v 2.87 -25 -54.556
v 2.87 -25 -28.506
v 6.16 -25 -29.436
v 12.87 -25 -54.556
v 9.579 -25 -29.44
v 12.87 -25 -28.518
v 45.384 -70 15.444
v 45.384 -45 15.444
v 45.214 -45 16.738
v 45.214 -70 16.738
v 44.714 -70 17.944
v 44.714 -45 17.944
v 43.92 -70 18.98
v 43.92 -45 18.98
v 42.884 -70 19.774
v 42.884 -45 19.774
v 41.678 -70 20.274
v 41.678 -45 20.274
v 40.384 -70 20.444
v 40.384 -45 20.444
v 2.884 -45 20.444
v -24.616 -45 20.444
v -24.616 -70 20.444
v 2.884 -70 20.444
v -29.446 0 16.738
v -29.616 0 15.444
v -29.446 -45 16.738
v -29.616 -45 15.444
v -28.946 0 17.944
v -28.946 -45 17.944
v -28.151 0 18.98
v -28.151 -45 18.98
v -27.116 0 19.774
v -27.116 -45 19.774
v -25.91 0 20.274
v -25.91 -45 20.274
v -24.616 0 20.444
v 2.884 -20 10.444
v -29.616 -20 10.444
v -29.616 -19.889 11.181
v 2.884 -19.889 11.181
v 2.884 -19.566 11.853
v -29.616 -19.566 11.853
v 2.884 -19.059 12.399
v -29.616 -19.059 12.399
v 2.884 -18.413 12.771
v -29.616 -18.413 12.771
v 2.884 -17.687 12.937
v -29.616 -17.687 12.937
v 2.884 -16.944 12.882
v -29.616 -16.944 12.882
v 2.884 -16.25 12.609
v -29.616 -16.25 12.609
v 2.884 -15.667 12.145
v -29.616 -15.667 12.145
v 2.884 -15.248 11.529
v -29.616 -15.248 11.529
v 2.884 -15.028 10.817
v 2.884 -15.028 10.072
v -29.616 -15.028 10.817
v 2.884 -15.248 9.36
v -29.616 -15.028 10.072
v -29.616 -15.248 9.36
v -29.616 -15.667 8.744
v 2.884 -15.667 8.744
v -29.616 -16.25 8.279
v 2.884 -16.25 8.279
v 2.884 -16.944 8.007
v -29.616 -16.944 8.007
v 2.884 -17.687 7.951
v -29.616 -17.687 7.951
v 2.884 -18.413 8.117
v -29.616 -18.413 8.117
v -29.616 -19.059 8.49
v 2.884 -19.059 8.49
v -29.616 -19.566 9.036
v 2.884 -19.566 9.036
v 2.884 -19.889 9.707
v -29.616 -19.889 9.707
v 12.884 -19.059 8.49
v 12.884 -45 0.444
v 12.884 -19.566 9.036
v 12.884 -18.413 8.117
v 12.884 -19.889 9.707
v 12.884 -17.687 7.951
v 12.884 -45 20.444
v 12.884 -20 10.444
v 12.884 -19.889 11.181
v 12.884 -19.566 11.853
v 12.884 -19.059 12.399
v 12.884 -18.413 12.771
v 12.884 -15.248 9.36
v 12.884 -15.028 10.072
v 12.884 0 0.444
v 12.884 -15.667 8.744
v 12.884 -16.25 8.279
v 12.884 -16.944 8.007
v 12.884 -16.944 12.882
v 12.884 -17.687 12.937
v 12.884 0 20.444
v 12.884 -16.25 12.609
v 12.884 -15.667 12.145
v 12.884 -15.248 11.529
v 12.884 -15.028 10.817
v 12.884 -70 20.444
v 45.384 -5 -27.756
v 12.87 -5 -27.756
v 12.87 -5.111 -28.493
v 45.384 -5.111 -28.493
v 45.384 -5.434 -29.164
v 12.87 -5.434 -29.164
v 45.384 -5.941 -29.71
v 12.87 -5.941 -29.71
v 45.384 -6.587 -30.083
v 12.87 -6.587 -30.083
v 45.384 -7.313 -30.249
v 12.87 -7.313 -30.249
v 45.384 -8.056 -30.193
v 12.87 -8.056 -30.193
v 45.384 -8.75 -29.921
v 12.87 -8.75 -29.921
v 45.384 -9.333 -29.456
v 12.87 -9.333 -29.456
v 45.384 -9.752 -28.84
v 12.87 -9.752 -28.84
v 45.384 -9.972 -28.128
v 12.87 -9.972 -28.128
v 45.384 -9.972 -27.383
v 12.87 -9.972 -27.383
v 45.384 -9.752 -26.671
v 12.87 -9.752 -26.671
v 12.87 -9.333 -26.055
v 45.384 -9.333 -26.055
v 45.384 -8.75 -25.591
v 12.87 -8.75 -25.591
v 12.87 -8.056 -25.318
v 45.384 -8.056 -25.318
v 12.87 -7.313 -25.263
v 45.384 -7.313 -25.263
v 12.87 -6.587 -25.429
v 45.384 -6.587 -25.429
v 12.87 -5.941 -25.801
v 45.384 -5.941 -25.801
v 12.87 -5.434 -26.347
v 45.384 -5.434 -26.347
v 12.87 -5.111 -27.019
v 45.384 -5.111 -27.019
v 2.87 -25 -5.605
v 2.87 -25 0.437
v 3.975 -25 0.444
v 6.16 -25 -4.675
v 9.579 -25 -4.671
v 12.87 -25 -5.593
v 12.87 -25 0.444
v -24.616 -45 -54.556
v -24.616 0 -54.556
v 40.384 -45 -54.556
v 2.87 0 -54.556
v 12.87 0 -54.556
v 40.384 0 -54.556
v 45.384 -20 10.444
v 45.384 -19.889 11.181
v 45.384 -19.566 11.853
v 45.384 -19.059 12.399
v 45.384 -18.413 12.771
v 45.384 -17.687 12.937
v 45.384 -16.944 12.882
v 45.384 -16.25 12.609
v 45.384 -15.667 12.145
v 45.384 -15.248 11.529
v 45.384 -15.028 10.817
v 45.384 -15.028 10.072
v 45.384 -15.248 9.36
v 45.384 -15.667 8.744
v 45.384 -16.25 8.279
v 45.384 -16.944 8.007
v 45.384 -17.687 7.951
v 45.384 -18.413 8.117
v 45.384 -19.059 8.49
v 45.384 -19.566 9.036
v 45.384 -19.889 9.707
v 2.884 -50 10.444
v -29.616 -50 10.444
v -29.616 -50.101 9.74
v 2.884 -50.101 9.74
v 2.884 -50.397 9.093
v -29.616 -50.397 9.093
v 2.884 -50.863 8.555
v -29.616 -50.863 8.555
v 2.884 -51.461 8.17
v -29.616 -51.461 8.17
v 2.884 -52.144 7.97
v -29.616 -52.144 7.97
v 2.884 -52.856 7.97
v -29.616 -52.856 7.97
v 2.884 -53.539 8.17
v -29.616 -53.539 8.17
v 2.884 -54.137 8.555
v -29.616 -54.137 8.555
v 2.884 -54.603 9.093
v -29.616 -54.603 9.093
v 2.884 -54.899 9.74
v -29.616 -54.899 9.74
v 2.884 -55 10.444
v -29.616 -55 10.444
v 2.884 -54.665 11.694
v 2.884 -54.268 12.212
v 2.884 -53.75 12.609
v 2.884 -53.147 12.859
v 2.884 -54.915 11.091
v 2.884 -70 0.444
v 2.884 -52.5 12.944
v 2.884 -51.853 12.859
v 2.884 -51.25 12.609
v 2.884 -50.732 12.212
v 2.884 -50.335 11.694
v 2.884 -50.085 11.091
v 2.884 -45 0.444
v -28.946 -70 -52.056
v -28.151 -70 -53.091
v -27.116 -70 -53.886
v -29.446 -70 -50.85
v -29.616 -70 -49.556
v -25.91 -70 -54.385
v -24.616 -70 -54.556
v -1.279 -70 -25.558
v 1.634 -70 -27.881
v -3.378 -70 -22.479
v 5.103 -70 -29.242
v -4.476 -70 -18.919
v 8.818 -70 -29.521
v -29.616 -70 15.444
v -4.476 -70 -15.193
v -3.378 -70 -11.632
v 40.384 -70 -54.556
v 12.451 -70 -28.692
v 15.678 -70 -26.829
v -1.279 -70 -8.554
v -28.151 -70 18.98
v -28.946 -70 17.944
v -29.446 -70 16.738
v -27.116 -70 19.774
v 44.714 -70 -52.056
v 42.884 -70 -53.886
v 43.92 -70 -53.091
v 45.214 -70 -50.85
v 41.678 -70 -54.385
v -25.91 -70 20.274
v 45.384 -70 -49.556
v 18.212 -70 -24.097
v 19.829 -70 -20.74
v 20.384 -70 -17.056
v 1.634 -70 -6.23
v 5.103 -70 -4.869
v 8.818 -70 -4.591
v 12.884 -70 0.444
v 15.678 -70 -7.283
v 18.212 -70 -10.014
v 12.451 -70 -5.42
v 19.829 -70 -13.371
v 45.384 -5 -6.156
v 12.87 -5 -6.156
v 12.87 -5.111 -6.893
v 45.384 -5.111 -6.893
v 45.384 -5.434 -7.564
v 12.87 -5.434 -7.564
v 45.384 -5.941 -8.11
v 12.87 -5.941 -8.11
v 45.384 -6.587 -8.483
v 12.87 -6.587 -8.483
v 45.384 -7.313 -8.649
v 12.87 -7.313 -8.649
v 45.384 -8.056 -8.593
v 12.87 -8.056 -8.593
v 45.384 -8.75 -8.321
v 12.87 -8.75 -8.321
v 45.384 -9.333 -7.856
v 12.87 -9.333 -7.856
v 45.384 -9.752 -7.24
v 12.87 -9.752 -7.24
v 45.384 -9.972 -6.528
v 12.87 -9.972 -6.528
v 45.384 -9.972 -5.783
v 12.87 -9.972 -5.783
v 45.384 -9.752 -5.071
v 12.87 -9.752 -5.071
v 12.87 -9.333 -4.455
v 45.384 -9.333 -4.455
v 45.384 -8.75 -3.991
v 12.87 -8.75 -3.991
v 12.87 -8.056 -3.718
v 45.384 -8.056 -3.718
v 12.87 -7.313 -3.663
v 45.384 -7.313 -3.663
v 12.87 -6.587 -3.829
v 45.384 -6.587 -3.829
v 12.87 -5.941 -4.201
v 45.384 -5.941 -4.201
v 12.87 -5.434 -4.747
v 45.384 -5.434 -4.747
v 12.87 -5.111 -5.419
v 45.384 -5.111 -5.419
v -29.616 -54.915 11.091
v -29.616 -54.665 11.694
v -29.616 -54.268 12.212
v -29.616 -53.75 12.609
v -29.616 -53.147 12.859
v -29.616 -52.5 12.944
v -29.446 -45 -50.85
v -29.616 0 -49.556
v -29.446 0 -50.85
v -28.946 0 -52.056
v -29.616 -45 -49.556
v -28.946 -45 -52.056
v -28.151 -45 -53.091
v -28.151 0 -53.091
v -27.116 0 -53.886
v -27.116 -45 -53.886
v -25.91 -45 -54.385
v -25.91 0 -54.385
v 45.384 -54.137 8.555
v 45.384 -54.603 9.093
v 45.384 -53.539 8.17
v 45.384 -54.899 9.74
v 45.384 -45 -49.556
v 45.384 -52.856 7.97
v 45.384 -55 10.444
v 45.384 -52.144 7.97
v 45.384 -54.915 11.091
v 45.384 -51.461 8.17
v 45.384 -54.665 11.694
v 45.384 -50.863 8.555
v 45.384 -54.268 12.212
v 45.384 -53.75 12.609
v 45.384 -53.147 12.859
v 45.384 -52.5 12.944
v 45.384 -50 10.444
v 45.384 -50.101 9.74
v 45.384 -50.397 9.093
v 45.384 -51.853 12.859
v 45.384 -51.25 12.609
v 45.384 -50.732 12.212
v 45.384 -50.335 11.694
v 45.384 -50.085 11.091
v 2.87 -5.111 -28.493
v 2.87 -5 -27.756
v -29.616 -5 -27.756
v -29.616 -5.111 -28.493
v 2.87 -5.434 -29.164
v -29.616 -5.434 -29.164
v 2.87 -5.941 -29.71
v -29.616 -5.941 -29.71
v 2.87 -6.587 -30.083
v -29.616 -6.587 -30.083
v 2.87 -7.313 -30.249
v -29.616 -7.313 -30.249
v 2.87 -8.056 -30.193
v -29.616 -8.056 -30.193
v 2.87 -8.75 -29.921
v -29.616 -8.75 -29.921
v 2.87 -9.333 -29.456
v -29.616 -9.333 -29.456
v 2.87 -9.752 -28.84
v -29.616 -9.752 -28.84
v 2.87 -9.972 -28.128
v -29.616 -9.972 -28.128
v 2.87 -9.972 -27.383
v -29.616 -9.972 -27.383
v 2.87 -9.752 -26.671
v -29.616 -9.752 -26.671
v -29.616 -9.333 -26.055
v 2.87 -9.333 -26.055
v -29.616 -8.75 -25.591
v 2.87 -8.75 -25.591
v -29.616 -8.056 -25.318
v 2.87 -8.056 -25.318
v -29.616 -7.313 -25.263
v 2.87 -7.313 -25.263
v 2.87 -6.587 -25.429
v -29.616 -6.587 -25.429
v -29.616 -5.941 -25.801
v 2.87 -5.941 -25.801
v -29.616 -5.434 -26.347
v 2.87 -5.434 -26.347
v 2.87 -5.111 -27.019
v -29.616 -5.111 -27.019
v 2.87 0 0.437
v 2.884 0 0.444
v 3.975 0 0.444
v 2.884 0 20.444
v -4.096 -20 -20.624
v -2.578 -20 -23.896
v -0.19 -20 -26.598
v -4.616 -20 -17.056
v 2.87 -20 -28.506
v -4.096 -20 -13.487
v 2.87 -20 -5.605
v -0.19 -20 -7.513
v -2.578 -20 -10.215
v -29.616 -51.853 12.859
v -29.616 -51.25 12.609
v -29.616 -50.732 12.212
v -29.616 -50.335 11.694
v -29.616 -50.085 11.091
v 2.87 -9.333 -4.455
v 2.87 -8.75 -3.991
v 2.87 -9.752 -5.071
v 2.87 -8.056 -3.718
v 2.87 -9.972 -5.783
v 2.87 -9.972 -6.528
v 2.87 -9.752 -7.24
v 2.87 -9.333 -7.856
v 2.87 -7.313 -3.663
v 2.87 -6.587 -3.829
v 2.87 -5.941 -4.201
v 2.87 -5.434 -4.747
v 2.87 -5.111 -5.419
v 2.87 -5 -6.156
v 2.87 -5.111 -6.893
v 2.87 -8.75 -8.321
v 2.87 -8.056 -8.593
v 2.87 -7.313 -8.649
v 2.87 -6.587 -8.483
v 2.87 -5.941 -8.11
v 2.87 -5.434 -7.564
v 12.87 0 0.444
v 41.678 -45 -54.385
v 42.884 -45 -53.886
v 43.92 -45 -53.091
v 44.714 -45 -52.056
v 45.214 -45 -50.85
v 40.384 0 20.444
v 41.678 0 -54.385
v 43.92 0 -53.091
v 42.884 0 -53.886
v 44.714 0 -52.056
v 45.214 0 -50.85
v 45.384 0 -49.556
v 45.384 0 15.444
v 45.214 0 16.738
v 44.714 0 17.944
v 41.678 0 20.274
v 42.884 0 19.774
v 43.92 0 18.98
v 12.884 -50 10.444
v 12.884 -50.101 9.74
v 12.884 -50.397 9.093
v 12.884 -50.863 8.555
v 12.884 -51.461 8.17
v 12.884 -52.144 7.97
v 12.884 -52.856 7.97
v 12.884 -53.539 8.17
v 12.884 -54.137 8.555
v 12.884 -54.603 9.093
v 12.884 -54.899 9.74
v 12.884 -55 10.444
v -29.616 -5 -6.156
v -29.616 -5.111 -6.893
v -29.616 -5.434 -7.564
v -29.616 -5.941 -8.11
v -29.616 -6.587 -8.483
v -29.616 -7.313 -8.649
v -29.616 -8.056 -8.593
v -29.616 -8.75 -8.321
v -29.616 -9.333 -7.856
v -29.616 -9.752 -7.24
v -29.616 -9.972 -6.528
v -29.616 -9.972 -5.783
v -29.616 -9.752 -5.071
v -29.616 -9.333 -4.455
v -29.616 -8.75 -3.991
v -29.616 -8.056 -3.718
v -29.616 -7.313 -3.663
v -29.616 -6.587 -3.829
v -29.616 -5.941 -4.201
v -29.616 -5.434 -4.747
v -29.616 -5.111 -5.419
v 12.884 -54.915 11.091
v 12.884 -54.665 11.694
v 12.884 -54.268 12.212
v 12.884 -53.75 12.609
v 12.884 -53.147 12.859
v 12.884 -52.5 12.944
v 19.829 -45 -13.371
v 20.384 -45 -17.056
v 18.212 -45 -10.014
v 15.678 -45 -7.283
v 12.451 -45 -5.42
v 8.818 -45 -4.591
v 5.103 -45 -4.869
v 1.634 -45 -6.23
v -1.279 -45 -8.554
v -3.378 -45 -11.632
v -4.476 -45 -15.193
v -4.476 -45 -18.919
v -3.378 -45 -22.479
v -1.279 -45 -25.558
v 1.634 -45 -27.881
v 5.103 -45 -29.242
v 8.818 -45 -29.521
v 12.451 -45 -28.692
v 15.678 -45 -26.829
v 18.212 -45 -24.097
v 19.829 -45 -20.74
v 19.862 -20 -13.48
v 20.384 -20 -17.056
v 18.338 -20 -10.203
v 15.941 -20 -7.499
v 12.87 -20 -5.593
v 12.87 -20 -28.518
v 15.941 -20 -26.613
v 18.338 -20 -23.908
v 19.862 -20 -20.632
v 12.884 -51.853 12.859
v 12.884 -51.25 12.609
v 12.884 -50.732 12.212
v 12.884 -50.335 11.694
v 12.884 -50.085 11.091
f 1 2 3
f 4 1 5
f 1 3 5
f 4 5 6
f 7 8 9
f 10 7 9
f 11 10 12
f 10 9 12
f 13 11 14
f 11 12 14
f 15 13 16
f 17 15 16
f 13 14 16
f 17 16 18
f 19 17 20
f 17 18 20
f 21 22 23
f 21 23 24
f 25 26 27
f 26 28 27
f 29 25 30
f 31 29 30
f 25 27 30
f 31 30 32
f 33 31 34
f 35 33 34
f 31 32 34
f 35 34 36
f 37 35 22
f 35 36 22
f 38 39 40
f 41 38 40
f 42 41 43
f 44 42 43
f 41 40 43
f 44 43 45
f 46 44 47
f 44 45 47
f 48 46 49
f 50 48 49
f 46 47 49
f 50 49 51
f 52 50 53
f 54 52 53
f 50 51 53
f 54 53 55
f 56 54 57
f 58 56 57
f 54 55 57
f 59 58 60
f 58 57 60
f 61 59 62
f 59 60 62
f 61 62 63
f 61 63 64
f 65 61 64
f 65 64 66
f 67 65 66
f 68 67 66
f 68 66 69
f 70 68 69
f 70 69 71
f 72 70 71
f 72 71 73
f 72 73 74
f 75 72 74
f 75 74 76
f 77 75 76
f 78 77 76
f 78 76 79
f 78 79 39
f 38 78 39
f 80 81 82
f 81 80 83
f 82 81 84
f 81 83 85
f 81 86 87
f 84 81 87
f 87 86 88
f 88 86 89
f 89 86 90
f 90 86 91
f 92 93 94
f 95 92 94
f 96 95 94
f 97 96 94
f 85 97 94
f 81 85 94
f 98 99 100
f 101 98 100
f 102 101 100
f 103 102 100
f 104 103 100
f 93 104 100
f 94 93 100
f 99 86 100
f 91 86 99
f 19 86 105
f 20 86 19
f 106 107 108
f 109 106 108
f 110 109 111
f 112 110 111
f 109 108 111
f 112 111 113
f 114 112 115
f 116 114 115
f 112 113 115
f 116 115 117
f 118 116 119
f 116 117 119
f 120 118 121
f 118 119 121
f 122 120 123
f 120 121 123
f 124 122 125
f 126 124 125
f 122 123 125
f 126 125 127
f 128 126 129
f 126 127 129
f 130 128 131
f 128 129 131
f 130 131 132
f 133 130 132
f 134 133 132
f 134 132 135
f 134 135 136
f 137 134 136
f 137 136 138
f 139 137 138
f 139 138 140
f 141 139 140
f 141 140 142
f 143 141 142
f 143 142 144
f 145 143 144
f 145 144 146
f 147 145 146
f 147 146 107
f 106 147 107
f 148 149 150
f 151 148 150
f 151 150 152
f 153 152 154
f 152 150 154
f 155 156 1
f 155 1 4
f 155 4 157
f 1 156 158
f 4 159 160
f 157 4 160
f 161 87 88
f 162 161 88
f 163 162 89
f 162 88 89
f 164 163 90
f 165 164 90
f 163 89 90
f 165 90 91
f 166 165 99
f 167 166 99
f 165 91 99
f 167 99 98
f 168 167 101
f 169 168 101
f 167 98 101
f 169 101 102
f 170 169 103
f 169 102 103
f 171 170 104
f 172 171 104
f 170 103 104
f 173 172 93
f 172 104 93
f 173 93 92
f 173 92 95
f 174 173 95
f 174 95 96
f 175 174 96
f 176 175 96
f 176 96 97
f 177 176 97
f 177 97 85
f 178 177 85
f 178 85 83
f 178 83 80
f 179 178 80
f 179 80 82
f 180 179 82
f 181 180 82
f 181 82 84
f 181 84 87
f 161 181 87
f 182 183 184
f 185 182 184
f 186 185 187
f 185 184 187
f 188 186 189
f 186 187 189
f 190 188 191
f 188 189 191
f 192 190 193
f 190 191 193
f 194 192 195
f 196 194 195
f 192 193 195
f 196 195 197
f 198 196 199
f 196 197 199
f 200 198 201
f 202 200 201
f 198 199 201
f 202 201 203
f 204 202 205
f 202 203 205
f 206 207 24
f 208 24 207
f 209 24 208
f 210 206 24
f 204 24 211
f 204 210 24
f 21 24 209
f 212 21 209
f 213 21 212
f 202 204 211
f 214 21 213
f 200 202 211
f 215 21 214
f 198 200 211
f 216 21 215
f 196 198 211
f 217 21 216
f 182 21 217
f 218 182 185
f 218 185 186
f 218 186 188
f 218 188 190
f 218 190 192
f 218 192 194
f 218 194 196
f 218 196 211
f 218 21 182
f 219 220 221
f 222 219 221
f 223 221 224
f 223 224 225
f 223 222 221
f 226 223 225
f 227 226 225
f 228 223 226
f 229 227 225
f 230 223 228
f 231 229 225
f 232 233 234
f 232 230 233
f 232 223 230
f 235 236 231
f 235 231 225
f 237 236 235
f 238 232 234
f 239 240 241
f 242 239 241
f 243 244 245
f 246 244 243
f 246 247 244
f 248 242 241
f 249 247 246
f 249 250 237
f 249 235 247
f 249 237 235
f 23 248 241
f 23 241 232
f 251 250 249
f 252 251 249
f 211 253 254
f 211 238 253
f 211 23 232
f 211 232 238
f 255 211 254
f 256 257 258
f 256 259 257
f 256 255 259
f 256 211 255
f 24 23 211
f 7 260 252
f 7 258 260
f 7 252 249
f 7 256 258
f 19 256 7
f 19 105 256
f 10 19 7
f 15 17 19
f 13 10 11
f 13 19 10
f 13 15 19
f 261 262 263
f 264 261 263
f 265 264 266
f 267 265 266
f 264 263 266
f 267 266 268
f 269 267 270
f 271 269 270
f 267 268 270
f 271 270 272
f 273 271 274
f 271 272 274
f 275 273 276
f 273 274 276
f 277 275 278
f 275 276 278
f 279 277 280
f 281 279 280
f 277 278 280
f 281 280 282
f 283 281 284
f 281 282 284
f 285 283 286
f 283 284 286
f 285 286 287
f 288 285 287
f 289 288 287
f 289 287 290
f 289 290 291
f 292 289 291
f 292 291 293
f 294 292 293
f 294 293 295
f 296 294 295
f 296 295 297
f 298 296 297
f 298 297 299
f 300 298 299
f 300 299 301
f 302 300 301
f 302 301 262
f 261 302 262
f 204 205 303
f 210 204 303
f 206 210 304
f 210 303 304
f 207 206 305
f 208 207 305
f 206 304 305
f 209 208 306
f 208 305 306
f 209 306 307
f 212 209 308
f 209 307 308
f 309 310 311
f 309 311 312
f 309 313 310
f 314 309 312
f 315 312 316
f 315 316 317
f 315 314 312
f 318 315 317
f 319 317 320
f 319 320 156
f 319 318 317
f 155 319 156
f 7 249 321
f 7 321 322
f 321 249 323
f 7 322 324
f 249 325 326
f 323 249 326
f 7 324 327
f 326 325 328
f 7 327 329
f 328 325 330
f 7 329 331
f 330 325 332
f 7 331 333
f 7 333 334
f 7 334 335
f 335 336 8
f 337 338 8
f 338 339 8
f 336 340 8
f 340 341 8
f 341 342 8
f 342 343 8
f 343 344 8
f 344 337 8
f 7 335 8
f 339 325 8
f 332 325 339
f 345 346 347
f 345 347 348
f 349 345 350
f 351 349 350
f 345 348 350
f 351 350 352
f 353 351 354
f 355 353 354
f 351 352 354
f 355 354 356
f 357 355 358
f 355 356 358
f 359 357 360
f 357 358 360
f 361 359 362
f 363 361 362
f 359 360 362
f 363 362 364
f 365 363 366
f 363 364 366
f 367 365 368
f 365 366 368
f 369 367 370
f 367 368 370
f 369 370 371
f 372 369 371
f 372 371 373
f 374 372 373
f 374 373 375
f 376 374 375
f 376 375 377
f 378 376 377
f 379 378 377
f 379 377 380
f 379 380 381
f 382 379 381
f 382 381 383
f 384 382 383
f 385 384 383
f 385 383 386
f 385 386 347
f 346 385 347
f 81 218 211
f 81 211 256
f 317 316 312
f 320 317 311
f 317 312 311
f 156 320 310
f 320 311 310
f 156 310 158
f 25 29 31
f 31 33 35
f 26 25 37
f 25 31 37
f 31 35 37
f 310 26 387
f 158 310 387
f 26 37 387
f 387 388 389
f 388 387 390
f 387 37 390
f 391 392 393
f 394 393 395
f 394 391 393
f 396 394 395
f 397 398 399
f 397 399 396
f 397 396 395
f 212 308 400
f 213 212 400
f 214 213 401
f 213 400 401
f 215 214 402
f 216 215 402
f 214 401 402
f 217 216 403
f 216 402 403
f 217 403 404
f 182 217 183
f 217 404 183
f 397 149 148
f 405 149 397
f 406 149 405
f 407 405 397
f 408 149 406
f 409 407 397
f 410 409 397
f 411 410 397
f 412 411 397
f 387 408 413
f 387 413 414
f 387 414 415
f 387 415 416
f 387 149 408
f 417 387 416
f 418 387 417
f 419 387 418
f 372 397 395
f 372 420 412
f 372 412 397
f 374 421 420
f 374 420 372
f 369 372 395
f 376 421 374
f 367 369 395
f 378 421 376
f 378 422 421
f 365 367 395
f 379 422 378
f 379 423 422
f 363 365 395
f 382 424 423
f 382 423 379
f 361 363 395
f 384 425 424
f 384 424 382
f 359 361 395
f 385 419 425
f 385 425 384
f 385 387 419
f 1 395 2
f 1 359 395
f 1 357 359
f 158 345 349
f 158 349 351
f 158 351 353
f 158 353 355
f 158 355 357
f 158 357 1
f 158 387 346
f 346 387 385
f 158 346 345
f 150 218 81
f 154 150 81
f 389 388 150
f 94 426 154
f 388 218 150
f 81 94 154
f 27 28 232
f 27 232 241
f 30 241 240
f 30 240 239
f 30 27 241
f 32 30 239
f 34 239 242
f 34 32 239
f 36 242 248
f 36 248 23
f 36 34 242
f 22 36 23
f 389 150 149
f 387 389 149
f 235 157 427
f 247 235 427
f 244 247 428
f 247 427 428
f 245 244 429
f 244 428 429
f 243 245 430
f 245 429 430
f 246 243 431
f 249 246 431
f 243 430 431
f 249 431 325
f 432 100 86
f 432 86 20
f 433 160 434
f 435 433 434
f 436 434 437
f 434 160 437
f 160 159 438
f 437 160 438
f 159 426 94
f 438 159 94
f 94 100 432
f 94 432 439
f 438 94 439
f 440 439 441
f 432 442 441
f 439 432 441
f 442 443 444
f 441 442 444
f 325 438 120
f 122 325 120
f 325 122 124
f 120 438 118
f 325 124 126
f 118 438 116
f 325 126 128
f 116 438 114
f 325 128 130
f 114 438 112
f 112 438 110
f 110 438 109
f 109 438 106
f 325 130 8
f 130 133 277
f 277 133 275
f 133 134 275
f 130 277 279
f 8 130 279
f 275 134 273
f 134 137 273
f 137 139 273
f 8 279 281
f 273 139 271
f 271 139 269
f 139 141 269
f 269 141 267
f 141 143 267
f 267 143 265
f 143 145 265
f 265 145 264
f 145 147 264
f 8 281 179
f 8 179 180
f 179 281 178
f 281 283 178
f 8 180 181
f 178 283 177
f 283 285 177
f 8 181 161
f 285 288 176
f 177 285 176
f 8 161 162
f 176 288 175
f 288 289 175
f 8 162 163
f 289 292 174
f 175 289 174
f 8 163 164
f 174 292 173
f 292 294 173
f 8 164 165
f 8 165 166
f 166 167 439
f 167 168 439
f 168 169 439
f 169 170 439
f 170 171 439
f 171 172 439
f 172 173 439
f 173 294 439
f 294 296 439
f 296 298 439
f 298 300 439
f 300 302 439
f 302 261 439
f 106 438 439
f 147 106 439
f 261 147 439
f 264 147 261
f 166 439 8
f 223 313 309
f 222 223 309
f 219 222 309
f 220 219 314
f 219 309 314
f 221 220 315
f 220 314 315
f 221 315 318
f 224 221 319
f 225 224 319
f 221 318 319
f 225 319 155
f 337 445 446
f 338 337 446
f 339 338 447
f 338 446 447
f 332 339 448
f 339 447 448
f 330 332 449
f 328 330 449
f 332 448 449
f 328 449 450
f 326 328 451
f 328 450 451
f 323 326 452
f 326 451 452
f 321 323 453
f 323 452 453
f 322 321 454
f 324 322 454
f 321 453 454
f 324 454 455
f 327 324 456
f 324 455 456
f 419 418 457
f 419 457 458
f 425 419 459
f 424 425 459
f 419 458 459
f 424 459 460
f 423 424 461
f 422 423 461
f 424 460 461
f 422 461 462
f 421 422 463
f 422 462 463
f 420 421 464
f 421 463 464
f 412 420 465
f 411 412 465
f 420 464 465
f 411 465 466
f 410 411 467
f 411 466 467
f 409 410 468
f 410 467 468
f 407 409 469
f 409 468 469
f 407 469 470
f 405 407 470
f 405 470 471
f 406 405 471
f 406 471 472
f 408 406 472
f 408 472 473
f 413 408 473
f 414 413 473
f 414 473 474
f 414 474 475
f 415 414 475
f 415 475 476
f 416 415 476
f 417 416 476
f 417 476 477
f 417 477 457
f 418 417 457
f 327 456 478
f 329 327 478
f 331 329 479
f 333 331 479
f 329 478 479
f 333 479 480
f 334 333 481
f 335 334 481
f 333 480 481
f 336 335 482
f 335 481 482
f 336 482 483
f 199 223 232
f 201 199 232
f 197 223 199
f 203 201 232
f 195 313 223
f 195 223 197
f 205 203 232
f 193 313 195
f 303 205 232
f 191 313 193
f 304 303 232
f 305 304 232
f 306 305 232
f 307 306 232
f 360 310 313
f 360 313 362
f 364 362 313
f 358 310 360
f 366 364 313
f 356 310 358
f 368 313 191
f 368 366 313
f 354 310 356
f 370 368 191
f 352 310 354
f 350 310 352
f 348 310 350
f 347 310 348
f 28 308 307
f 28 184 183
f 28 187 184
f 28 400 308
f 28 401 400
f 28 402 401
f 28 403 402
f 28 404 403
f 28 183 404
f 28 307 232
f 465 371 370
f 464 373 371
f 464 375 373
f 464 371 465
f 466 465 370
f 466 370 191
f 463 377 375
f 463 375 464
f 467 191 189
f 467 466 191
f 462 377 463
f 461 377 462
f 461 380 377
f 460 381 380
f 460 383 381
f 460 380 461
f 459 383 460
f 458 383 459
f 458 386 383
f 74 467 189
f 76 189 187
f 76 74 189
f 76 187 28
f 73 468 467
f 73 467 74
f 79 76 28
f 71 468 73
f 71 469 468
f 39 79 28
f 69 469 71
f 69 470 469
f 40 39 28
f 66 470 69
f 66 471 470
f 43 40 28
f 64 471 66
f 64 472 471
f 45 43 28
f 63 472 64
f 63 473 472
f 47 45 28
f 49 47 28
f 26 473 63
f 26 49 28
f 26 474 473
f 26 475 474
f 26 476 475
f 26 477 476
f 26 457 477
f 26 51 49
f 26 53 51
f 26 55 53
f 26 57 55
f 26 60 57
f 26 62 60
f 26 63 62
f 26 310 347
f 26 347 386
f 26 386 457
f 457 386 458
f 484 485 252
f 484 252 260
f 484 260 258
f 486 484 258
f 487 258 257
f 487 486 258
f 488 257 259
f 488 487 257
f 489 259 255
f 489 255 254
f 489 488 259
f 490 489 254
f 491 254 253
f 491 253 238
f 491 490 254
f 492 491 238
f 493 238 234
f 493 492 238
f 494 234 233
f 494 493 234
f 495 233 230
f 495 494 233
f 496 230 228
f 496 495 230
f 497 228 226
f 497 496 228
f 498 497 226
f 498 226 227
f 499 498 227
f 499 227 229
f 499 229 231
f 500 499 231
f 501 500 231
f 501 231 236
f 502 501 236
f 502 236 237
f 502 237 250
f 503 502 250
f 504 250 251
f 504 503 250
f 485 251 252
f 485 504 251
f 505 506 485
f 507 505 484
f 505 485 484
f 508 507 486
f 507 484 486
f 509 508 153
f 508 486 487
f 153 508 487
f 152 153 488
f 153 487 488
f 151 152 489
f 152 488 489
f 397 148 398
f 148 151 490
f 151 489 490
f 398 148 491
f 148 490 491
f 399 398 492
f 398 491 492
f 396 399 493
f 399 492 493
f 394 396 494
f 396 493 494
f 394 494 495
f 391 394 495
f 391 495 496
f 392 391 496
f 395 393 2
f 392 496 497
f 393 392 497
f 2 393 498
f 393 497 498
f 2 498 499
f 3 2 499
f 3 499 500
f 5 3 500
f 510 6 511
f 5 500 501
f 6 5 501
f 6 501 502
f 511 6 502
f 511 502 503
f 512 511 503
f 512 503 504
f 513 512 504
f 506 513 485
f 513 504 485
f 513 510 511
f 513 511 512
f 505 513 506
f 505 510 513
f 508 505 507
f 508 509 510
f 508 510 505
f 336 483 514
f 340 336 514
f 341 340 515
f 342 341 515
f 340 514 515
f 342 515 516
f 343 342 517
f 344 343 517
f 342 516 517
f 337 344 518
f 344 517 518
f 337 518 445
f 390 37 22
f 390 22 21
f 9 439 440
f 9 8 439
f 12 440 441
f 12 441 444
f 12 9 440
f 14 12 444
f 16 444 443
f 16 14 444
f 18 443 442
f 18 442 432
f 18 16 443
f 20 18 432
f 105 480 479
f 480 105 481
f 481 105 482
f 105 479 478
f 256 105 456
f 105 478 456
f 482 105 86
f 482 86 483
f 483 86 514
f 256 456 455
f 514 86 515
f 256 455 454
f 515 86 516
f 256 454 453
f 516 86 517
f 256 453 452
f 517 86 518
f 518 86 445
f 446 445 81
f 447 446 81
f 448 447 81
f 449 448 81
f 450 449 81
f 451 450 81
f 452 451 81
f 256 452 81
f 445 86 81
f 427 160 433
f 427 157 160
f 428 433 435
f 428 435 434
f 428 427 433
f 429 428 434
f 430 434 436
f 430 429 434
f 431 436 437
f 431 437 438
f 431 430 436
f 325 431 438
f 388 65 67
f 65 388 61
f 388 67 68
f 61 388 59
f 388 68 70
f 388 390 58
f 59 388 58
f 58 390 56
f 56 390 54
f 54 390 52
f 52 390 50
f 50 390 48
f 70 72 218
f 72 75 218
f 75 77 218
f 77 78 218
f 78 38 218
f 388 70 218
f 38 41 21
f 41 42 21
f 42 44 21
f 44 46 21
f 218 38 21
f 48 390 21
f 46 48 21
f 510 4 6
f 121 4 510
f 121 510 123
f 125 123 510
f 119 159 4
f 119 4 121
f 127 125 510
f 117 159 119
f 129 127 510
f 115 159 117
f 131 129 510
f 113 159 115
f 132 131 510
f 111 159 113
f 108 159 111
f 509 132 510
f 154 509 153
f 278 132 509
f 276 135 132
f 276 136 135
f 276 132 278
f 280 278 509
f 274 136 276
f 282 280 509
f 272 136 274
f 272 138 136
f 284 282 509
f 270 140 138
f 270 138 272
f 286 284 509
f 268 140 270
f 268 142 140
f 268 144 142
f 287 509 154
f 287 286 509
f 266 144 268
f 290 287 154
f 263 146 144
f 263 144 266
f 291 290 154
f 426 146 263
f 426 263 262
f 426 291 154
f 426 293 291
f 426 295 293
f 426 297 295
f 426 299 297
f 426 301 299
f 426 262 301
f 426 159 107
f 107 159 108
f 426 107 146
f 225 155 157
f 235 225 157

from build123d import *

# Parameters (mm, degrees)
F0_W      = 75
F0_H      = 75
F1_DEPTH  = 45
F2_R      = 5
F3_R      = 12.5
F4_DEPTH  = 25
F6_DEPTH  = 20
F8_DEPTH  = 25
F10_DEPTH = 75.001
F11_DEPTH = 25
F12_R     = 2.5
F13_DEPTH = 75.001


with BuildPart() as f1:
    # F0 (on Front) → F1 (new body)
    with BuildSketch(Plane.XZ):
        with Locations((7.8840382397, -17.0557253063)):
            Rectangle(F0_W, F0_H)
    extrude(amount=F1_DEPTH)

    # F2
    f2_edges = [f1.edges().sort_by_distance(p)[0] for p in [
        (-29.615962, -22.5, 20.444275),
        (-29.615962, -22.5, -54.555725),
        (45.384038, -22.5, -54.555725),
        (45.384038, -22.5, 20.444275),
    ]]
    fillet(f2_edges, radius=F2_R)

    # F3 (on face) → F4 (cut)
    with BuildSketch(Plane.XZ.offset(45)):
        with Locations((7.8840382397, -17.0557253063)):
            Circle(F3_R)
    extrude(amount=-F4_DEPTH, mode=Mode.SUBTRACT)

    # F5 (on face) → F6 (cut)
    with BuildSketch(Plane.XY.offset(20.4442746937)):
        Polygon((7.8840382397, -25), (7.8840382397, 0), (2.8840382397, 0), (2.8840382397, -45), (7.8840382397, -45), align=None)
        Polygon((12.8840382397, 0), (7.8840382397, 0), (7.8840382397, -25), (7.8840382397, -45), (12.8840382397, -45), align=None)
    extrude(amount=-F6_DEPTH, mode=Mode.SUBTRACT)

    # F7 (on face) → F8 (cut)
    with BuildSketch(Plane.XZ):
        Polygon((12.8703957796, 0.5023097037), (2.8703957796, 0.4370668321), (2.8703957796, -54.635066539), (12.8703957796, -54.635066539), align=None)
    extrude(amount=F8_DEPTH, mode=Mode.SUBTRACT)

    # F9 (on face) → F10 (cut, through all)
    with BuildSketch(Plane(origin=(-29.6159617603, 0, 0), x_dir=(0, -1, 0), z_dir=(-1, 0, 0))):
        with BuildLine():
            ThreePointArc((10, -27.7557253063), (7.5, -25.2557253063), (5, -27.7557253063))
            ThreePointArc((5, -27.7557253063), (7.5, -30.2557253063), (10, -27.7557253063))
        make_face()
        with BuildLine():
            ThreePointArc((10, -6.1557253063), (7.5, -3.6557253063), (5, -6.1557253063))
            ThreePointArc((5, -6.1557253063), (7.5, -8.6557253063), (10, -6.1557253063))
        make_face()
    extrude(amount=-F10_DEPTH, mode=Mode.SUBTRACT)

    # F11 (add): a face of the model
    f11_faces = [f1.faces().sort_by_distance(p)[0] for p in [
        (43.1695721457, -45, -52.3412592122),
    ]]
    extrude(f11_faces, amount=F11_DEPTH)

    # F12 (on face) → F13 (cut, through all)
    with BuildSketch(Plane(origin=(-29.6159617603, 0, 0), x_dir=(0, -1, 0), z_dir=(-1, 0, 0))):
        with BuildLine():
            ThreePointArc((55, 10.4442746937), (54.267766953, 12.2120416467), (52.5, 12.9442746937))
            Line((52.5, 12.9442746937), (52.5, 10.4442746937))
            Line((52.5, 10.4442746937), (50, 10.4442746937))
            ThreePointArc((50, 10.4442746937), (52.5, 7.9442746937), (55, 10.4442746937))
        make_face()
        with Locations((17.5, 10.4442746937)):
            Circle(F12_R)
        with BuildLine():
            Line((52.5, 10.4442746937), (52.5, 12.9442746937))
            ThreePointArc((52.5, 12.9442746937), (50.732233047, 12.2120416467), (50, 10.4442746937))
            Line((50, 10.4442746937), (52.5, 10.4442746937))
        make_face()
    extrude(amount=-F13_DEPTH, mode=Mode.SUBTRACT)


solid = f1.part
